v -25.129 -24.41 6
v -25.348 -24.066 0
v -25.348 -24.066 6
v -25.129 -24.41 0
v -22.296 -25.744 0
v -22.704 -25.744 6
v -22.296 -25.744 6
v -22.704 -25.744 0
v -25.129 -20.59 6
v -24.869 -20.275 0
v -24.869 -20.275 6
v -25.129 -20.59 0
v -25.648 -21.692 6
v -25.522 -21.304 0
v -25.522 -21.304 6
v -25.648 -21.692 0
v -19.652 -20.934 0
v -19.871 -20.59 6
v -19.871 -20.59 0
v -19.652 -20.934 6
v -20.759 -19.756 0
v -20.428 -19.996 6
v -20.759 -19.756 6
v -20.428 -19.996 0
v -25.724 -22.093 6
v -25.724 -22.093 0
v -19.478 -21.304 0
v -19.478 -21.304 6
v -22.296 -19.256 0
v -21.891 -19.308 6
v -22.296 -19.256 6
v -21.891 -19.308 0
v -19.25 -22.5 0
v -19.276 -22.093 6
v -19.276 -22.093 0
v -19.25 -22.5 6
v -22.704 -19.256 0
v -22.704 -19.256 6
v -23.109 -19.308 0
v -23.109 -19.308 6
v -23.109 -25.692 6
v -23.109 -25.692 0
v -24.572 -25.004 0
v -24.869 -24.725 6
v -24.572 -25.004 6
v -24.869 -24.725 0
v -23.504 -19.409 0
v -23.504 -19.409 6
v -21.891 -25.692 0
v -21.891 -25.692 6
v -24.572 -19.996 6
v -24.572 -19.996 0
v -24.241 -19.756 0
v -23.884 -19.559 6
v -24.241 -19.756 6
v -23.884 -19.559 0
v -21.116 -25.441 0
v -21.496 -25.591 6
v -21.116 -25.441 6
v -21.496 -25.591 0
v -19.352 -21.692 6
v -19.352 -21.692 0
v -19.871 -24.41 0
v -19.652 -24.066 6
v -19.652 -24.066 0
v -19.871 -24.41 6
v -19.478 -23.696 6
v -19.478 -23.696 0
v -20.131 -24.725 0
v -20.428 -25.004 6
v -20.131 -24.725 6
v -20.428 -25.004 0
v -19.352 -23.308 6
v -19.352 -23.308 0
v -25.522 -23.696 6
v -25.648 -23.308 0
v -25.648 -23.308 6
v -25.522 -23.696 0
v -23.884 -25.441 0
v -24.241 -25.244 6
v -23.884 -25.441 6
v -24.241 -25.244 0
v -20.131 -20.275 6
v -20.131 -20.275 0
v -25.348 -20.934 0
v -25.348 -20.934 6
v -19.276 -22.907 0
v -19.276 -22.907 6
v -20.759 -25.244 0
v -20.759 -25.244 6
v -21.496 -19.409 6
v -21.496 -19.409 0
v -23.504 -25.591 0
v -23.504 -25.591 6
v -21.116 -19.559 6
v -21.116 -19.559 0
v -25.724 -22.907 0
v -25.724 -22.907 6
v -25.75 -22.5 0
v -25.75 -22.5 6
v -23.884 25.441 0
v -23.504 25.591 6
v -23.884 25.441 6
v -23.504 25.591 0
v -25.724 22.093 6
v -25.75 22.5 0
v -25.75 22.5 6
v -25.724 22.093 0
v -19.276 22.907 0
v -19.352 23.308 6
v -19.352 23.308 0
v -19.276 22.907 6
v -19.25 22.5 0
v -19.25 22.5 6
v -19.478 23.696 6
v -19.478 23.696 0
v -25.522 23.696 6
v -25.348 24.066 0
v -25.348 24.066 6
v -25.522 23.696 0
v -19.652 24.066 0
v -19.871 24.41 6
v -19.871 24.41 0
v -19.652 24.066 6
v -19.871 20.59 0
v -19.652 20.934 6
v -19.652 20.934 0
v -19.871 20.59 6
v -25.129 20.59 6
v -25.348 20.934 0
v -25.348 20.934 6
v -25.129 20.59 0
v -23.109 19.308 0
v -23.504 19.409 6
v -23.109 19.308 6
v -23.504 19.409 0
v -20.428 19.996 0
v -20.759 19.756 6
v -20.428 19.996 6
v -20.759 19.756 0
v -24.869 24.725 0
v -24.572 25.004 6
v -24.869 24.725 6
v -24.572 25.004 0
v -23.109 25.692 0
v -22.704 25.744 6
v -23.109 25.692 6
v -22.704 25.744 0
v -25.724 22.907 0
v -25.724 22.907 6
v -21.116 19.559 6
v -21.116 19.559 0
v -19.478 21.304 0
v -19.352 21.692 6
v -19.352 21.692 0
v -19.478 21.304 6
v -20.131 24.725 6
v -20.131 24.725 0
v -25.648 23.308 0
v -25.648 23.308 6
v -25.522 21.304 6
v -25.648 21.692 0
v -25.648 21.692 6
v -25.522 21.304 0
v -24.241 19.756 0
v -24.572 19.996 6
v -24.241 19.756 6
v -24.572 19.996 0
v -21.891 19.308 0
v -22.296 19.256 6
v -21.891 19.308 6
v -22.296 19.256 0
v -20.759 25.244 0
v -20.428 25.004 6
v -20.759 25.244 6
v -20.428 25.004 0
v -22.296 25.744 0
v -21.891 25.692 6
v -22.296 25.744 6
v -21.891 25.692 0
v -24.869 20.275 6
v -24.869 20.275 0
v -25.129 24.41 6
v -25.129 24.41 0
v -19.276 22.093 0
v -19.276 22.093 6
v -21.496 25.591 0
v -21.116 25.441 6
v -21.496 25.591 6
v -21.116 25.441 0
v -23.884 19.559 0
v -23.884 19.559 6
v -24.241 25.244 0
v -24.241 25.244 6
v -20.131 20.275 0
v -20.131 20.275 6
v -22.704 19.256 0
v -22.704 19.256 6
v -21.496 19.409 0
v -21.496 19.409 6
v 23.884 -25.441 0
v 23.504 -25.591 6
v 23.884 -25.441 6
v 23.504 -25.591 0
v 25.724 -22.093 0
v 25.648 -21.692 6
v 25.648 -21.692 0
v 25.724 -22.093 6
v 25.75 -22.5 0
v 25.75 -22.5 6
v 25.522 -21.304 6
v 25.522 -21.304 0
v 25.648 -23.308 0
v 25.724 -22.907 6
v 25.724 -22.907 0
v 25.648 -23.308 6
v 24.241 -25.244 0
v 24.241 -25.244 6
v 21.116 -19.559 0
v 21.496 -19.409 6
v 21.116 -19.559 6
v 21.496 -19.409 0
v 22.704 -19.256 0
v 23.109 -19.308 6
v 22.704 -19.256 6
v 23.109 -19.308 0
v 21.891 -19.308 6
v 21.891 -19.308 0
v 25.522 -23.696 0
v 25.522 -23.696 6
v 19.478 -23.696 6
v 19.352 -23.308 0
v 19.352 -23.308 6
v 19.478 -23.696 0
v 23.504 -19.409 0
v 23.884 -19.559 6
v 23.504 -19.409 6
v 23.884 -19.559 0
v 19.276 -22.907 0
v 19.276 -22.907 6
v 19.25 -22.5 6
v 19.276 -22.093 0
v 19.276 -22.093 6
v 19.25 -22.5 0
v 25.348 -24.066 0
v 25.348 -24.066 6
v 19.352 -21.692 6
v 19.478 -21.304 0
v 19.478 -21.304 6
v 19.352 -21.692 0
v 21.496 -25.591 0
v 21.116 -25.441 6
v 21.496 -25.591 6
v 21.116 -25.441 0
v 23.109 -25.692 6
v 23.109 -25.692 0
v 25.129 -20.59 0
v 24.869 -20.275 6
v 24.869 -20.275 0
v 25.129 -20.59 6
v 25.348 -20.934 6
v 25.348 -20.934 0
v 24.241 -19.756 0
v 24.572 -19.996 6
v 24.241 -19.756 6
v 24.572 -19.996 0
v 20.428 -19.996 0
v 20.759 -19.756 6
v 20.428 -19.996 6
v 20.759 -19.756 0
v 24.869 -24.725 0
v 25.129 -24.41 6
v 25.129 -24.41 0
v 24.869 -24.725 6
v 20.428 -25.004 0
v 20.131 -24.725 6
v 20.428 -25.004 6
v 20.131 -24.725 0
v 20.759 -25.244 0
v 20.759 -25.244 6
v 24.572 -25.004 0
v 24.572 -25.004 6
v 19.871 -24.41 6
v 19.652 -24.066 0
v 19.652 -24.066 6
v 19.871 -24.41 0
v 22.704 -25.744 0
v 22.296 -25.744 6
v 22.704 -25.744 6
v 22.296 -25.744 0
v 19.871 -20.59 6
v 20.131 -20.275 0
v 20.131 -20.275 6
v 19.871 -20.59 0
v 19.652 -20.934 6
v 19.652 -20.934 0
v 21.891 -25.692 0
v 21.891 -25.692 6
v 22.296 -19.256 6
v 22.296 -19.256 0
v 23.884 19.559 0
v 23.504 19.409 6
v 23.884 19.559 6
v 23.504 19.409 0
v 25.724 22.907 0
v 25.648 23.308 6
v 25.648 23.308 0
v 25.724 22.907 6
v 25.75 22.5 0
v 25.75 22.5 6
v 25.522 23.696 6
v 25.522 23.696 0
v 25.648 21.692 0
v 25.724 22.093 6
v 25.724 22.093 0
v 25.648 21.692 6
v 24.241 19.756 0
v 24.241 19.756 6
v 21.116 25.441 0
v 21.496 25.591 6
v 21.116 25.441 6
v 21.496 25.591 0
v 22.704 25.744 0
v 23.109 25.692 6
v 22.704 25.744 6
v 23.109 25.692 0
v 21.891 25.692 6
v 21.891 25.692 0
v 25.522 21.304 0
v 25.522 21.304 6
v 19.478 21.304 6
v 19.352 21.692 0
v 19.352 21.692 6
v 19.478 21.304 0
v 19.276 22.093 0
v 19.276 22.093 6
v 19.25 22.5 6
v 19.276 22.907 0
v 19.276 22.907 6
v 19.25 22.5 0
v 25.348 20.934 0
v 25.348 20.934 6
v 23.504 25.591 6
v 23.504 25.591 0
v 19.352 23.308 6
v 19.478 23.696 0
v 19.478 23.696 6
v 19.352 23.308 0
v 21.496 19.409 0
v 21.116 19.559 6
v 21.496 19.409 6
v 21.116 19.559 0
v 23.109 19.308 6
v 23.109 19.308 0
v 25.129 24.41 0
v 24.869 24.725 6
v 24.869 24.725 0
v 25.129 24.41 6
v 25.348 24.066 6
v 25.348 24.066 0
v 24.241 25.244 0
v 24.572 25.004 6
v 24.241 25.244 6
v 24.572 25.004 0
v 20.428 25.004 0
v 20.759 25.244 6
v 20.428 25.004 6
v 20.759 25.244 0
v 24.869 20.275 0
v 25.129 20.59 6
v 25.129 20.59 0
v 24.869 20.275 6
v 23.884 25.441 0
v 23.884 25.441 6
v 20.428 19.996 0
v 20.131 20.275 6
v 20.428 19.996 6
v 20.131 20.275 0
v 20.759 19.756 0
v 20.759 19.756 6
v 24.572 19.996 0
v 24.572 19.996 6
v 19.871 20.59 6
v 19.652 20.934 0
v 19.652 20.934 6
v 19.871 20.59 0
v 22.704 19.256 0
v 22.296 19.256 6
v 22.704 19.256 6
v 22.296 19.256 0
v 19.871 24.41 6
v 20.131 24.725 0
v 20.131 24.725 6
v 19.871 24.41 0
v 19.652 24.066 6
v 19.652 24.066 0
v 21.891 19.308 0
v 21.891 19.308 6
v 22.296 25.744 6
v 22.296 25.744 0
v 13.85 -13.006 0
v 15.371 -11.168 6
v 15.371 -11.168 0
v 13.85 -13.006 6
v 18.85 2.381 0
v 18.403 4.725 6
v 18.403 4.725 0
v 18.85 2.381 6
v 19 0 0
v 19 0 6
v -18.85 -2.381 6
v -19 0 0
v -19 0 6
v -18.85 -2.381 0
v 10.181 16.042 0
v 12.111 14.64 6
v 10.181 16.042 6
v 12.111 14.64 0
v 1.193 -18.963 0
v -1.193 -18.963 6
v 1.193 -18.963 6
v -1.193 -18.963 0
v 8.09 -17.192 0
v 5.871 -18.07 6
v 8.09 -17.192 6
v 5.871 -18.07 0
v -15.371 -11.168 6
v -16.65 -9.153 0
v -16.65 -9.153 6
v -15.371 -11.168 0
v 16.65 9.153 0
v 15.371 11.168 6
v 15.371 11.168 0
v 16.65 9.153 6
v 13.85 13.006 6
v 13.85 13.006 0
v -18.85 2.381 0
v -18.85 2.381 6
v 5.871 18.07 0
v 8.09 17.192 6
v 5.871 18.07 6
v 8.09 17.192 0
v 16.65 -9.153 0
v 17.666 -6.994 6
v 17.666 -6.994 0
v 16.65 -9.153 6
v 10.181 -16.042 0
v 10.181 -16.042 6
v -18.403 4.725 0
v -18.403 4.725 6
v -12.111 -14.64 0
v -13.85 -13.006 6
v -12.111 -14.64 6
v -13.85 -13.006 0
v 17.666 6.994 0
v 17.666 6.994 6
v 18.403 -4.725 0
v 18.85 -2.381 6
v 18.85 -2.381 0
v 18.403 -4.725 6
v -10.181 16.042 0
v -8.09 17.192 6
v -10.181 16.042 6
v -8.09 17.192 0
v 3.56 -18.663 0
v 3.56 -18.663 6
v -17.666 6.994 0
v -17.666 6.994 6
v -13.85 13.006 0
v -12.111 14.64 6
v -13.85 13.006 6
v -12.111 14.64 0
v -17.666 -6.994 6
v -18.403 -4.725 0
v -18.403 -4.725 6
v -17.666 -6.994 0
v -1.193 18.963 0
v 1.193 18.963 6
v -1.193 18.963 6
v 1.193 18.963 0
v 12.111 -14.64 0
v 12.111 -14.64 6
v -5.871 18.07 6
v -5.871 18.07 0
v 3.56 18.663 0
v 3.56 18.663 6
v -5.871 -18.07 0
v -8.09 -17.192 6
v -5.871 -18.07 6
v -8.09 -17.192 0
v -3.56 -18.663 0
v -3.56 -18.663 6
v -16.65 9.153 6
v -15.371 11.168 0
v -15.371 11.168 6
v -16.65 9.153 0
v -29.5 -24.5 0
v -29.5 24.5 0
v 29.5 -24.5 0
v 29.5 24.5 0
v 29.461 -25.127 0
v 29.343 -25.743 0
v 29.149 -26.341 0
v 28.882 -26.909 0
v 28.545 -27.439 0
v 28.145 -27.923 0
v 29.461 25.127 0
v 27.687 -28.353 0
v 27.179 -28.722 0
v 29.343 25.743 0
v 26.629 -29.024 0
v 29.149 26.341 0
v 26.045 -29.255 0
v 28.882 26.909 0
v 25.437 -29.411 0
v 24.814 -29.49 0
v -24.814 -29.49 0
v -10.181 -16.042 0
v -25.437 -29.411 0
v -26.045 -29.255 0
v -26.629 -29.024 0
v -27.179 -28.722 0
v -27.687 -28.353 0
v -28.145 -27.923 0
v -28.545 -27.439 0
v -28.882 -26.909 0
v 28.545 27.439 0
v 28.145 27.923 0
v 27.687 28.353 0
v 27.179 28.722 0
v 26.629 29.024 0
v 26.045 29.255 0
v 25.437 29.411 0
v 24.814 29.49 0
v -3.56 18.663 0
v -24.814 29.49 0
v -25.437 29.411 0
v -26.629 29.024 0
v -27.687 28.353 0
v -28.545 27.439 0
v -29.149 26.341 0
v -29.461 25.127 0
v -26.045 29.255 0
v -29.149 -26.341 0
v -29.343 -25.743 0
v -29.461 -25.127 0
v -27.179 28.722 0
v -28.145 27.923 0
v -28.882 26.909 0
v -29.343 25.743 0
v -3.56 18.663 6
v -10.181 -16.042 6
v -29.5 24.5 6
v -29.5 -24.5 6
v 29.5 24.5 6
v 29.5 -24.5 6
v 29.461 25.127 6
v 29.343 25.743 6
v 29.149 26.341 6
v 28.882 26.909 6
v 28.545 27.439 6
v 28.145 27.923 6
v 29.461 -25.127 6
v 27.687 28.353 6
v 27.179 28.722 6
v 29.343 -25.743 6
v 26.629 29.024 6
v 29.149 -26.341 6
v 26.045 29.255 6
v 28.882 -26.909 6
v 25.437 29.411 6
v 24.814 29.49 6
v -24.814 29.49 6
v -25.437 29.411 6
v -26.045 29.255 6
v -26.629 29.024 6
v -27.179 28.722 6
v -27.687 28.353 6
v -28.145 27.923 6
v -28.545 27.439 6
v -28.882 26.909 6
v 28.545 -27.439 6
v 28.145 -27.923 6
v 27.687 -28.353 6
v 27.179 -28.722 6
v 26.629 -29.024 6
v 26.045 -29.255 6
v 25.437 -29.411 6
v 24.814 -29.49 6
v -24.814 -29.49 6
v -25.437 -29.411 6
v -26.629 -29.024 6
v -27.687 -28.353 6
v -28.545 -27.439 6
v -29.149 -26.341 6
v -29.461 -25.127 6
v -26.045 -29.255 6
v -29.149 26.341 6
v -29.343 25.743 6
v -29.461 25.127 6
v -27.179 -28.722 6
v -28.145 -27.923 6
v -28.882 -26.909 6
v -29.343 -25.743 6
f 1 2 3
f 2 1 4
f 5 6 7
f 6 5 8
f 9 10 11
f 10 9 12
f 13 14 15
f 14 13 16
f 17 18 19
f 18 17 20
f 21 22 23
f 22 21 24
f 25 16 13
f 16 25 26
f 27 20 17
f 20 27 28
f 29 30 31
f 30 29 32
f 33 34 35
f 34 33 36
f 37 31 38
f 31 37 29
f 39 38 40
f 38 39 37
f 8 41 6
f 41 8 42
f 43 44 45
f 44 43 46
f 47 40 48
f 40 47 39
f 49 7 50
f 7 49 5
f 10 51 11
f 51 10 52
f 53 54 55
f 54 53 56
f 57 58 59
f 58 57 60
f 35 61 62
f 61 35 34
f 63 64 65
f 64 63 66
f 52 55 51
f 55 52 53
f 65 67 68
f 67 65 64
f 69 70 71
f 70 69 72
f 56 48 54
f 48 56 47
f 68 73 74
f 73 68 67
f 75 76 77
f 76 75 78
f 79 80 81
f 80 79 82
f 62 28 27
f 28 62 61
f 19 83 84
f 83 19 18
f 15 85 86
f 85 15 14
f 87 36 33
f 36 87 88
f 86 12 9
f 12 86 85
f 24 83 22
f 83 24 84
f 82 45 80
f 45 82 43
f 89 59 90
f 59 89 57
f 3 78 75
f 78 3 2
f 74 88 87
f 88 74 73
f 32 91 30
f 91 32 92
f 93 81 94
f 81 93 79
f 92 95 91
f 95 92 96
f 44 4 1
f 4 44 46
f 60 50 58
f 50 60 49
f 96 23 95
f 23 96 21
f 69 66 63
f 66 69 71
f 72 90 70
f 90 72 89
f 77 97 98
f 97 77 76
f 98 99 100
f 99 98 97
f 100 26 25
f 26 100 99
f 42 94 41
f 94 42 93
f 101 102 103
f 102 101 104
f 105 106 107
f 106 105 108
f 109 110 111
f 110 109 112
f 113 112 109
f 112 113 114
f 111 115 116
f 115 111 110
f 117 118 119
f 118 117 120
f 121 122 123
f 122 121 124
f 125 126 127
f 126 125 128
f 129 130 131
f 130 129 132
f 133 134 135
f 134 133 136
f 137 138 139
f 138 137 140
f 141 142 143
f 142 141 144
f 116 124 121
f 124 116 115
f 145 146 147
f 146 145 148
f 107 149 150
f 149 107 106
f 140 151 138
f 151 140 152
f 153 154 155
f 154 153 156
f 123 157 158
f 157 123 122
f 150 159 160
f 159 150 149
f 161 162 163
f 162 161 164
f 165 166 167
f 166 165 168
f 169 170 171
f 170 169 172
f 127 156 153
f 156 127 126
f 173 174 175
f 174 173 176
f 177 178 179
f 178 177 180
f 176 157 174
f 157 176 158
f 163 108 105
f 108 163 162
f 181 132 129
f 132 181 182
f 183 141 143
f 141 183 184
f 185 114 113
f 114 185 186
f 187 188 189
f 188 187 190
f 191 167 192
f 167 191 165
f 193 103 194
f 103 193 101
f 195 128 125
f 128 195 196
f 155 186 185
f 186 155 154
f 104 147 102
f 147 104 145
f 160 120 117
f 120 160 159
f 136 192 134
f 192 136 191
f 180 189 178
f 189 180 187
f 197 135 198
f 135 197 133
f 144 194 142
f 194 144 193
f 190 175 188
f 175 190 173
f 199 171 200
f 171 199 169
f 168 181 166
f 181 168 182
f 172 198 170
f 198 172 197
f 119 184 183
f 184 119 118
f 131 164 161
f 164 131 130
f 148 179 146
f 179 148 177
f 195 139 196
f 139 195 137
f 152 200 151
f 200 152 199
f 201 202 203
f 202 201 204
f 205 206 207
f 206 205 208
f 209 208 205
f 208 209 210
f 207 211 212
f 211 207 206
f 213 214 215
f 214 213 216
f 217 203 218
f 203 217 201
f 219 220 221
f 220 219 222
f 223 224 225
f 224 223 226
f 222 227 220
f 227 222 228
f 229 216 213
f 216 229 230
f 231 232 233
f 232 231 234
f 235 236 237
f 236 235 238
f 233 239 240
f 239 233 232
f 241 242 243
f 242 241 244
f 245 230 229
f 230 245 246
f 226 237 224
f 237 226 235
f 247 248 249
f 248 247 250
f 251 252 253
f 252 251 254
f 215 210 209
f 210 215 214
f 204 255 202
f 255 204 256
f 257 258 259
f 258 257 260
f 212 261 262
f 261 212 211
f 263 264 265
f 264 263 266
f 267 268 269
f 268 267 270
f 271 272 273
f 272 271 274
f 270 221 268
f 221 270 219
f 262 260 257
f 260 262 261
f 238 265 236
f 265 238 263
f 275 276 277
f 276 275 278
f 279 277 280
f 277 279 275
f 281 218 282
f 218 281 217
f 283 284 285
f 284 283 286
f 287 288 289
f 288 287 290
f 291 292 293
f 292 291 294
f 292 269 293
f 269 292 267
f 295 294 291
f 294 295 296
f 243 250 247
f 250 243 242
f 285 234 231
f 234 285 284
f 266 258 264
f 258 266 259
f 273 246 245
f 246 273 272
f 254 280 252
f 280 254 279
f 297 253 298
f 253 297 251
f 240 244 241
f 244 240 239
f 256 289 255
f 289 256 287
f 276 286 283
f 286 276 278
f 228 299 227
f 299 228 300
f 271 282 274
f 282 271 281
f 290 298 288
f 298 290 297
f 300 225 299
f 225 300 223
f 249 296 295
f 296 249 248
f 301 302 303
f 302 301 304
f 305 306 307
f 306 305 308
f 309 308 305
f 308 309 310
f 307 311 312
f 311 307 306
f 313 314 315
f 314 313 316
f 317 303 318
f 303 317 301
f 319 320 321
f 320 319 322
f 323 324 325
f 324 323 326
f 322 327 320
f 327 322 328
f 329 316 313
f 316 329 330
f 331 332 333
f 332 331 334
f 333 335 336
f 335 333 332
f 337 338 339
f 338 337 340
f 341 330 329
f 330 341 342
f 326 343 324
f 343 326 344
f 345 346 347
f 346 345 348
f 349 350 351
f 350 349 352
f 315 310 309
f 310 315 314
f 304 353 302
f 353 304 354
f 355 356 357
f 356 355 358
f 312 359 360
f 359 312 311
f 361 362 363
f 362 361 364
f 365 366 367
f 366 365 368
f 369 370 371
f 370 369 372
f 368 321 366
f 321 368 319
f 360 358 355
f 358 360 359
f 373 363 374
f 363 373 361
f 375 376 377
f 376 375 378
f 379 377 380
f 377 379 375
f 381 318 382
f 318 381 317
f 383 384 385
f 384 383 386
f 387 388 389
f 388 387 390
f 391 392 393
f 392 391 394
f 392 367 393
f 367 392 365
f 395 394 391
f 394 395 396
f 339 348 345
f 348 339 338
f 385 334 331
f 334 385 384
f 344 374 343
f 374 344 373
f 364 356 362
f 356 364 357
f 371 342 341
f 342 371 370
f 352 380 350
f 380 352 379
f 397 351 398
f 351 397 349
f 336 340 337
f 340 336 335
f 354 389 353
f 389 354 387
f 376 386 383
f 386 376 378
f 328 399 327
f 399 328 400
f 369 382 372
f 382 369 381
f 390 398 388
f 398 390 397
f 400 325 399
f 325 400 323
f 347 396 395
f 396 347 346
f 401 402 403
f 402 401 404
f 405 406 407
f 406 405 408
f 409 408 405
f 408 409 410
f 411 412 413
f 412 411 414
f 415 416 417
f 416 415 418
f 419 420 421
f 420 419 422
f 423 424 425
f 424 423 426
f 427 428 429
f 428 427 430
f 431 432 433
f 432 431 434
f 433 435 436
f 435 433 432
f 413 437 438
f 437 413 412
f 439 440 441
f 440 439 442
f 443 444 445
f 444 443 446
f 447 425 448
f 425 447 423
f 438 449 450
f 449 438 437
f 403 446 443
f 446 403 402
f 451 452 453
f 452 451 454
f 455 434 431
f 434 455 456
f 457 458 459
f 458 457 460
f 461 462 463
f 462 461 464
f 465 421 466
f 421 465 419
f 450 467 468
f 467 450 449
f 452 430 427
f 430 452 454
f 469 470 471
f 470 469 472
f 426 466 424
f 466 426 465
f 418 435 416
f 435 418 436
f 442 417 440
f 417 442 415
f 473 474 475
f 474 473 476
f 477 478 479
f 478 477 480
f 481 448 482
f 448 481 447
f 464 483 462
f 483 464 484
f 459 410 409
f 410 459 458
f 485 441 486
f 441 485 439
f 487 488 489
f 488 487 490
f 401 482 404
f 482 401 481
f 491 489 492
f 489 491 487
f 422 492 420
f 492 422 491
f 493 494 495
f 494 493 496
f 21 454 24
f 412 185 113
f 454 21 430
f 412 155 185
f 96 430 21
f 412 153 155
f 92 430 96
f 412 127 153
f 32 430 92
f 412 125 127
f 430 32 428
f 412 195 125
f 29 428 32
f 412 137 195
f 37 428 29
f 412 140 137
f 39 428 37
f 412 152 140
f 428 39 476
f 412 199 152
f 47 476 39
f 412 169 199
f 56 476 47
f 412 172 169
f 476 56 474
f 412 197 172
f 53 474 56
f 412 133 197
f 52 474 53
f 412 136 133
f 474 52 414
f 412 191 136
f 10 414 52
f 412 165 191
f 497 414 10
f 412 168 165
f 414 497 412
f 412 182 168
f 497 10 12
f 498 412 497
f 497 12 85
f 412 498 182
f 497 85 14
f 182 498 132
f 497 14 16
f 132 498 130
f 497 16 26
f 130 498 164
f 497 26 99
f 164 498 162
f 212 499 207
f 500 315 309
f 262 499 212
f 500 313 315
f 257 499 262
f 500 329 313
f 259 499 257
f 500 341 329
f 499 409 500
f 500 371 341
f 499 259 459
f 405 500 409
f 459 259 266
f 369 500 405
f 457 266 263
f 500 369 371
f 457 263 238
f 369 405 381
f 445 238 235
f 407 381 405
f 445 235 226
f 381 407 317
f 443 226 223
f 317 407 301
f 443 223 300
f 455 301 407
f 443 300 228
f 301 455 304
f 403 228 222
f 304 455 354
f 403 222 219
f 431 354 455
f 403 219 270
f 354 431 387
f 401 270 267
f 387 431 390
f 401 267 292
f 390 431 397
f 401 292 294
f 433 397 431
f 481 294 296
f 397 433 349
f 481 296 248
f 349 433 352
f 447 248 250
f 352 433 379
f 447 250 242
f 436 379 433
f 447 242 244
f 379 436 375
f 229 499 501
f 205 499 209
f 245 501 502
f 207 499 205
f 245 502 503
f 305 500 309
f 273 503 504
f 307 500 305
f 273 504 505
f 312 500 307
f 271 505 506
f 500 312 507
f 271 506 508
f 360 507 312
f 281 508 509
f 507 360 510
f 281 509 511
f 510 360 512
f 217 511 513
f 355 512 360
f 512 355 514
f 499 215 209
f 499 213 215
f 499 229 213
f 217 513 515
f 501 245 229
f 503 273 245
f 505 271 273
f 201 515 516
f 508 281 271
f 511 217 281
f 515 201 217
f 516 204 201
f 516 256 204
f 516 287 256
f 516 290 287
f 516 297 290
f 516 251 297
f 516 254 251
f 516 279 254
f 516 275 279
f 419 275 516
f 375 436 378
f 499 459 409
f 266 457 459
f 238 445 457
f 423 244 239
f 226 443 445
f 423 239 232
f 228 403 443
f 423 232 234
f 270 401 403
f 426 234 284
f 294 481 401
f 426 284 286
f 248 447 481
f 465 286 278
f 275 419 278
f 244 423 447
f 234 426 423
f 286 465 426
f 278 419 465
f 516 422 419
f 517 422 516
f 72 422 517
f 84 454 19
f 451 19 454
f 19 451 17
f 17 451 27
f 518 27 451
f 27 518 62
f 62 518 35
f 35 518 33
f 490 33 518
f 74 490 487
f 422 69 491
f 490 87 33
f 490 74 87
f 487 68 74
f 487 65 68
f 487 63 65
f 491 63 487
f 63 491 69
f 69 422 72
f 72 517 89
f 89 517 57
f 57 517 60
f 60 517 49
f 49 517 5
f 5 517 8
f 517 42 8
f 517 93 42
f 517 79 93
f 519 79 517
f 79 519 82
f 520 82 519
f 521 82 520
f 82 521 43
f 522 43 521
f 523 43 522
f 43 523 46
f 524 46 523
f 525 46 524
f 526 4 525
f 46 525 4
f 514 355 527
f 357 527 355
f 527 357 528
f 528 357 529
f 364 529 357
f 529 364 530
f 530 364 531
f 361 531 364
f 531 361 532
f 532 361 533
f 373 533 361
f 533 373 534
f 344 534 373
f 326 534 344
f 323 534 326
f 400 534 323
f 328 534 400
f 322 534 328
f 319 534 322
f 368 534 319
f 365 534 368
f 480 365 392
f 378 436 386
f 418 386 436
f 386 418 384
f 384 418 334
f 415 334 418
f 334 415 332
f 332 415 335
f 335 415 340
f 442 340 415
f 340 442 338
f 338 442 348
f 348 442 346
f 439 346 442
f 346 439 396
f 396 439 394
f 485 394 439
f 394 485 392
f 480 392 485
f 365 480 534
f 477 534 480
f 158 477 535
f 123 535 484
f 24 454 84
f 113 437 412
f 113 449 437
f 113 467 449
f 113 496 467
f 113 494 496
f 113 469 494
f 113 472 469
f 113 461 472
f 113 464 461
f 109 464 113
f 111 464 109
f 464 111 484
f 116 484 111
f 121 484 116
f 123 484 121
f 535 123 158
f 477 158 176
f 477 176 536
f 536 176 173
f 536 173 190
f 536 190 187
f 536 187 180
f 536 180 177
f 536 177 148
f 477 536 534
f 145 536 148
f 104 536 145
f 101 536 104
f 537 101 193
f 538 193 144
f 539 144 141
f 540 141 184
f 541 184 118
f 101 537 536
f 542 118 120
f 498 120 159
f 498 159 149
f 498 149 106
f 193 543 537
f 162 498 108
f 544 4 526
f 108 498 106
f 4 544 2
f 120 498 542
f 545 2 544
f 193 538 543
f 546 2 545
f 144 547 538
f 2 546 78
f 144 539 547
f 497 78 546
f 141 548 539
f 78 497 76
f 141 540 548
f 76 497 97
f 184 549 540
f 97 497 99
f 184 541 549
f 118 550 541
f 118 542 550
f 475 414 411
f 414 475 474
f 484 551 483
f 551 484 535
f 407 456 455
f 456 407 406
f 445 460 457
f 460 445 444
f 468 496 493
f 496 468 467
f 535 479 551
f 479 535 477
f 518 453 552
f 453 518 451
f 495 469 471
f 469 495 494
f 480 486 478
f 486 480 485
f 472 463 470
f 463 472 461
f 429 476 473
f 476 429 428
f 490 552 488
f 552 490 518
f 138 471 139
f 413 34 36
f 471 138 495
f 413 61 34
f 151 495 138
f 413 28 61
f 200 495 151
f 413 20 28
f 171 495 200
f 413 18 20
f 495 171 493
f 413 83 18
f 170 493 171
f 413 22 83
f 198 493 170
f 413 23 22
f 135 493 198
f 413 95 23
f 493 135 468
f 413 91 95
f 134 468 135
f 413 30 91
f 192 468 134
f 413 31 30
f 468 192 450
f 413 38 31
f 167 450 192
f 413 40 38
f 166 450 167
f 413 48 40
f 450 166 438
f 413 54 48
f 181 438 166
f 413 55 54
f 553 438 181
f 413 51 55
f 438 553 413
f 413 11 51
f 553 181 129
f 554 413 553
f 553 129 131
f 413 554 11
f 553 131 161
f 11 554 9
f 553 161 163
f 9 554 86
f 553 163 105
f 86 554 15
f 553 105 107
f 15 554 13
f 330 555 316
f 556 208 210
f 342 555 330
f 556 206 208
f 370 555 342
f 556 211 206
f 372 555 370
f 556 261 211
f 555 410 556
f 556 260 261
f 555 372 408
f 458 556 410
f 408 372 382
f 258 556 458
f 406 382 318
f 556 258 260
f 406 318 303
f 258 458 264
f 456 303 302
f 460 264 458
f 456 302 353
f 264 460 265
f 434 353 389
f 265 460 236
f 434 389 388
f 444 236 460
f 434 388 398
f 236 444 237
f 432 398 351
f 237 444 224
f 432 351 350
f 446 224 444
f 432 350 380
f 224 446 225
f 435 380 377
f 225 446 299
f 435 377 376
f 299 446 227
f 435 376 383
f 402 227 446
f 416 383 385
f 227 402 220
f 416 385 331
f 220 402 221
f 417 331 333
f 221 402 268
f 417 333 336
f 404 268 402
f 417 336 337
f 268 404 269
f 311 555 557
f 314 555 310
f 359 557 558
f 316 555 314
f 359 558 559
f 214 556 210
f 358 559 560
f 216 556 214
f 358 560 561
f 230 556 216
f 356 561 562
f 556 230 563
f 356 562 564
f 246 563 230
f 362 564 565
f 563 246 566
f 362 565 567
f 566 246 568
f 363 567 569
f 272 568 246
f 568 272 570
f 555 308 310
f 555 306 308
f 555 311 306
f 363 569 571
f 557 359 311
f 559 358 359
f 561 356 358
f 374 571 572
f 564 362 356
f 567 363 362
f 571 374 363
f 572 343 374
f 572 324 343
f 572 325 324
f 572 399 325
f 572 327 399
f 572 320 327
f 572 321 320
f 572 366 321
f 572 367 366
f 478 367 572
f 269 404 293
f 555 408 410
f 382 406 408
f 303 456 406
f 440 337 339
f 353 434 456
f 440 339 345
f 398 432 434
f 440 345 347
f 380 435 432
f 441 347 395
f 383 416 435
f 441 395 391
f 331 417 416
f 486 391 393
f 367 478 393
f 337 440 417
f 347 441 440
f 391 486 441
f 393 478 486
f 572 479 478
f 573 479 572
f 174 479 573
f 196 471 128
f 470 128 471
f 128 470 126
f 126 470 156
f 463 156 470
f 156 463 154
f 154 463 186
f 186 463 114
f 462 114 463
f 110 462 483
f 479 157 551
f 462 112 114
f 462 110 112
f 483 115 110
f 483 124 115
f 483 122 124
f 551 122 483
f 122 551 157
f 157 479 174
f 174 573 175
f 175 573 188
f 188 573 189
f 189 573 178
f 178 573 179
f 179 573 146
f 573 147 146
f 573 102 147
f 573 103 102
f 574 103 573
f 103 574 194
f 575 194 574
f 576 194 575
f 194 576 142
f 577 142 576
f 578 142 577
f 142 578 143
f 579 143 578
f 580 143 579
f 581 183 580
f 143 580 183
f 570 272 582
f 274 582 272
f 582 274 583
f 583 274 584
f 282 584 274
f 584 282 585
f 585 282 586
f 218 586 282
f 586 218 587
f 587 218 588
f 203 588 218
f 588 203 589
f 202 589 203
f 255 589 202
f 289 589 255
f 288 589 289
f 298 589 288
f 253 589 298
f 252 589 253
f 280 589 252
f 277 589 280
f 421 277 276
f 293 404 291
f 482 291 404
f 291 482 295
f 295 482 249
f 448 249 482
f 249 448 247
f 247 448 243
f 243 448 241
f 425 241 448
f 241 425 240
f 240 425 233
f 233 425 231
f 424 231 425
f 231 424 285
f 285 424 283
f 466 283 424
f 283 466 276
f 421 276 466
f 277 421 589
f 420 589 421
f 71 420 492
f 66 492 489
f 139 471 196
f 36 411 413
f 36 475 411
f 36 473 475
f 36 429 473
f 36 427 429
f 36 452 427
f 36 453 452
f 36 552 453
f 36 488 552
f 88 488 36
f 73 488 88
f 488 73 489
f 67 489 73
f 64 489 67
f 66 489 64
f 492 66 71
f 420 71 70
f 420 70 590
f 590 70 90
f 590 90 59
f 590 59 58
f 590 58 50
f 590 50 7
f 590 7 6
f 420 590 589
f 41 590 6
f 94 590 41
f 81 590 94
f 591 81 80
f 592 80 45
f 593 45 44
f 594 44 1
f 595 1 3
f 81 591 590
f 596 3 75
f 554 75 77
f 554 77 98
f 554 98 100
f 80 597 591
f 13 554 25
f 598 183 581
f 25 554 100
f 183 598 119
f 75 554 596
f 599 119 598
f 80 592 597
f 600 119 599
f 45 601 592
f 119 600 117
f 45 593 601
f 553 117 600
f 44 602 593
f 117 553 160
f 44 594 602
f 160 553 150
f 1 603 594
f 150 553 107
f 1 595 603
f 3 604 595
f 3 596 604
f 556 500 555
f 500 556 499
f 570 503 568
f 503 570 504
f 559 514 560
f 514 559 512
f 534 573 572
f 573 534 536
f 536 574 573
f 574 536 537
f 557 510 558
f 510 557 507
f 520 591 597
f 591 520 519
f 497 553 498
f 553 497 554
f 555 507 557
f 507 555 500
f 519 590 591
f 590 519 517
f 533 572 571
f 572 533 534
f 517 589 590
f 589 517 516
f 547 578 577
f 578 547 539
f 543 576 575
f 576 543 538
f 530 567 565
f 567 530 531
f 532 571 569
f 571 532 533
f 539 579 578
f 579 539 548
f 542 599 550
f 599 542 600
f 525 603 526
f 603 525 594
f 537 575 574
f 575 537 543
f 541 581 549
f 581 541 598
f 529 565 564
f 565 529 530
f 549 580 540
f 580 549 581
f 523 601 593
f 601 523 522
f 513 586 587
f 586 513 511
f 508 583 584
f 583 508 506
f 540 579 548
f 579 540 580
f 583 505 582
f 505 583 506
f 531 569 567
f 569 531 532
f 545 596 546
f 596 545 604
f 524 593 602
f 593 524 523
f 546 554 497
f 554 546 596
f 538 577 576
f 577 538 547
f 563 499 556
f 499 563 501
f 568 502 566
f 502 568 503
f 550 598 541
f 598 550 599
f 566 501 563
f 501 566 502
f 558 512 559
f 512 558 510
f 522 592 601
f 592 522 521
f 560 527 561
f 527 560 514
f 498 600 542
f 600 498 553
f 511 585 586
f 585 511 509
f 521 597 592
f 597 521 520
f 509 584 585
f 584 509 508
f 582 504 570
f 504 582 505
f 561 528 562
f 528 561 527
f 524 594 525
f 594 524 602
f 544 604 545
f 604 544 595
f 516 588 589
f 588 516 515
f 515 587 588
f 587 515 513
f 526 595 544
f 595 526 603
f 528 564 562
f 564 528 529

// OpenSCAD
$fn = 50;


difference() {
	union() {
		hull() {
			translate(v = [-24.5000000000, 24.5000000000, 0]) {
				cylinder(h = 6, r = 5);
			}
			translate(v = [24.5000000000, 24.5000000000, 0]) {
				cylinder(h = 6, r = 5);
			}
			translate(v = [-24.5000000000, -24.5000000000, 0]) {
				cylinder(h = 6, r = 5);
			}
			translate(v = [24.5000000000, -24.5000000000, 0]) {
				cylinder(h = 6, r = 5);
			}
		}
	}
	union() {
		#translate(v = [-22.5000000000, -22.5000000000, -100.0000000000]) {
			cylinder(h = 200, r = 3.2500000000);
		}
		#translate(v = [-22.5000000000, 22.5000000000, -100.0000000000]) {
			cylinder(h = 200, r = 3.2500000000);
		}
		#translate(v = [22.5000000000, -22.5000000000, -100.0000000000]) {
			cylinder(h = 200, r = 3.2500000000);
		}
		#translate(v = [22.5000000000, 22.5000000000, -100.0000000000]) {
			cylinder(h = 200, r = 3.2500000000);
		}
		#cylinder(h = 6, r = 19.0000000000);
	}
}
